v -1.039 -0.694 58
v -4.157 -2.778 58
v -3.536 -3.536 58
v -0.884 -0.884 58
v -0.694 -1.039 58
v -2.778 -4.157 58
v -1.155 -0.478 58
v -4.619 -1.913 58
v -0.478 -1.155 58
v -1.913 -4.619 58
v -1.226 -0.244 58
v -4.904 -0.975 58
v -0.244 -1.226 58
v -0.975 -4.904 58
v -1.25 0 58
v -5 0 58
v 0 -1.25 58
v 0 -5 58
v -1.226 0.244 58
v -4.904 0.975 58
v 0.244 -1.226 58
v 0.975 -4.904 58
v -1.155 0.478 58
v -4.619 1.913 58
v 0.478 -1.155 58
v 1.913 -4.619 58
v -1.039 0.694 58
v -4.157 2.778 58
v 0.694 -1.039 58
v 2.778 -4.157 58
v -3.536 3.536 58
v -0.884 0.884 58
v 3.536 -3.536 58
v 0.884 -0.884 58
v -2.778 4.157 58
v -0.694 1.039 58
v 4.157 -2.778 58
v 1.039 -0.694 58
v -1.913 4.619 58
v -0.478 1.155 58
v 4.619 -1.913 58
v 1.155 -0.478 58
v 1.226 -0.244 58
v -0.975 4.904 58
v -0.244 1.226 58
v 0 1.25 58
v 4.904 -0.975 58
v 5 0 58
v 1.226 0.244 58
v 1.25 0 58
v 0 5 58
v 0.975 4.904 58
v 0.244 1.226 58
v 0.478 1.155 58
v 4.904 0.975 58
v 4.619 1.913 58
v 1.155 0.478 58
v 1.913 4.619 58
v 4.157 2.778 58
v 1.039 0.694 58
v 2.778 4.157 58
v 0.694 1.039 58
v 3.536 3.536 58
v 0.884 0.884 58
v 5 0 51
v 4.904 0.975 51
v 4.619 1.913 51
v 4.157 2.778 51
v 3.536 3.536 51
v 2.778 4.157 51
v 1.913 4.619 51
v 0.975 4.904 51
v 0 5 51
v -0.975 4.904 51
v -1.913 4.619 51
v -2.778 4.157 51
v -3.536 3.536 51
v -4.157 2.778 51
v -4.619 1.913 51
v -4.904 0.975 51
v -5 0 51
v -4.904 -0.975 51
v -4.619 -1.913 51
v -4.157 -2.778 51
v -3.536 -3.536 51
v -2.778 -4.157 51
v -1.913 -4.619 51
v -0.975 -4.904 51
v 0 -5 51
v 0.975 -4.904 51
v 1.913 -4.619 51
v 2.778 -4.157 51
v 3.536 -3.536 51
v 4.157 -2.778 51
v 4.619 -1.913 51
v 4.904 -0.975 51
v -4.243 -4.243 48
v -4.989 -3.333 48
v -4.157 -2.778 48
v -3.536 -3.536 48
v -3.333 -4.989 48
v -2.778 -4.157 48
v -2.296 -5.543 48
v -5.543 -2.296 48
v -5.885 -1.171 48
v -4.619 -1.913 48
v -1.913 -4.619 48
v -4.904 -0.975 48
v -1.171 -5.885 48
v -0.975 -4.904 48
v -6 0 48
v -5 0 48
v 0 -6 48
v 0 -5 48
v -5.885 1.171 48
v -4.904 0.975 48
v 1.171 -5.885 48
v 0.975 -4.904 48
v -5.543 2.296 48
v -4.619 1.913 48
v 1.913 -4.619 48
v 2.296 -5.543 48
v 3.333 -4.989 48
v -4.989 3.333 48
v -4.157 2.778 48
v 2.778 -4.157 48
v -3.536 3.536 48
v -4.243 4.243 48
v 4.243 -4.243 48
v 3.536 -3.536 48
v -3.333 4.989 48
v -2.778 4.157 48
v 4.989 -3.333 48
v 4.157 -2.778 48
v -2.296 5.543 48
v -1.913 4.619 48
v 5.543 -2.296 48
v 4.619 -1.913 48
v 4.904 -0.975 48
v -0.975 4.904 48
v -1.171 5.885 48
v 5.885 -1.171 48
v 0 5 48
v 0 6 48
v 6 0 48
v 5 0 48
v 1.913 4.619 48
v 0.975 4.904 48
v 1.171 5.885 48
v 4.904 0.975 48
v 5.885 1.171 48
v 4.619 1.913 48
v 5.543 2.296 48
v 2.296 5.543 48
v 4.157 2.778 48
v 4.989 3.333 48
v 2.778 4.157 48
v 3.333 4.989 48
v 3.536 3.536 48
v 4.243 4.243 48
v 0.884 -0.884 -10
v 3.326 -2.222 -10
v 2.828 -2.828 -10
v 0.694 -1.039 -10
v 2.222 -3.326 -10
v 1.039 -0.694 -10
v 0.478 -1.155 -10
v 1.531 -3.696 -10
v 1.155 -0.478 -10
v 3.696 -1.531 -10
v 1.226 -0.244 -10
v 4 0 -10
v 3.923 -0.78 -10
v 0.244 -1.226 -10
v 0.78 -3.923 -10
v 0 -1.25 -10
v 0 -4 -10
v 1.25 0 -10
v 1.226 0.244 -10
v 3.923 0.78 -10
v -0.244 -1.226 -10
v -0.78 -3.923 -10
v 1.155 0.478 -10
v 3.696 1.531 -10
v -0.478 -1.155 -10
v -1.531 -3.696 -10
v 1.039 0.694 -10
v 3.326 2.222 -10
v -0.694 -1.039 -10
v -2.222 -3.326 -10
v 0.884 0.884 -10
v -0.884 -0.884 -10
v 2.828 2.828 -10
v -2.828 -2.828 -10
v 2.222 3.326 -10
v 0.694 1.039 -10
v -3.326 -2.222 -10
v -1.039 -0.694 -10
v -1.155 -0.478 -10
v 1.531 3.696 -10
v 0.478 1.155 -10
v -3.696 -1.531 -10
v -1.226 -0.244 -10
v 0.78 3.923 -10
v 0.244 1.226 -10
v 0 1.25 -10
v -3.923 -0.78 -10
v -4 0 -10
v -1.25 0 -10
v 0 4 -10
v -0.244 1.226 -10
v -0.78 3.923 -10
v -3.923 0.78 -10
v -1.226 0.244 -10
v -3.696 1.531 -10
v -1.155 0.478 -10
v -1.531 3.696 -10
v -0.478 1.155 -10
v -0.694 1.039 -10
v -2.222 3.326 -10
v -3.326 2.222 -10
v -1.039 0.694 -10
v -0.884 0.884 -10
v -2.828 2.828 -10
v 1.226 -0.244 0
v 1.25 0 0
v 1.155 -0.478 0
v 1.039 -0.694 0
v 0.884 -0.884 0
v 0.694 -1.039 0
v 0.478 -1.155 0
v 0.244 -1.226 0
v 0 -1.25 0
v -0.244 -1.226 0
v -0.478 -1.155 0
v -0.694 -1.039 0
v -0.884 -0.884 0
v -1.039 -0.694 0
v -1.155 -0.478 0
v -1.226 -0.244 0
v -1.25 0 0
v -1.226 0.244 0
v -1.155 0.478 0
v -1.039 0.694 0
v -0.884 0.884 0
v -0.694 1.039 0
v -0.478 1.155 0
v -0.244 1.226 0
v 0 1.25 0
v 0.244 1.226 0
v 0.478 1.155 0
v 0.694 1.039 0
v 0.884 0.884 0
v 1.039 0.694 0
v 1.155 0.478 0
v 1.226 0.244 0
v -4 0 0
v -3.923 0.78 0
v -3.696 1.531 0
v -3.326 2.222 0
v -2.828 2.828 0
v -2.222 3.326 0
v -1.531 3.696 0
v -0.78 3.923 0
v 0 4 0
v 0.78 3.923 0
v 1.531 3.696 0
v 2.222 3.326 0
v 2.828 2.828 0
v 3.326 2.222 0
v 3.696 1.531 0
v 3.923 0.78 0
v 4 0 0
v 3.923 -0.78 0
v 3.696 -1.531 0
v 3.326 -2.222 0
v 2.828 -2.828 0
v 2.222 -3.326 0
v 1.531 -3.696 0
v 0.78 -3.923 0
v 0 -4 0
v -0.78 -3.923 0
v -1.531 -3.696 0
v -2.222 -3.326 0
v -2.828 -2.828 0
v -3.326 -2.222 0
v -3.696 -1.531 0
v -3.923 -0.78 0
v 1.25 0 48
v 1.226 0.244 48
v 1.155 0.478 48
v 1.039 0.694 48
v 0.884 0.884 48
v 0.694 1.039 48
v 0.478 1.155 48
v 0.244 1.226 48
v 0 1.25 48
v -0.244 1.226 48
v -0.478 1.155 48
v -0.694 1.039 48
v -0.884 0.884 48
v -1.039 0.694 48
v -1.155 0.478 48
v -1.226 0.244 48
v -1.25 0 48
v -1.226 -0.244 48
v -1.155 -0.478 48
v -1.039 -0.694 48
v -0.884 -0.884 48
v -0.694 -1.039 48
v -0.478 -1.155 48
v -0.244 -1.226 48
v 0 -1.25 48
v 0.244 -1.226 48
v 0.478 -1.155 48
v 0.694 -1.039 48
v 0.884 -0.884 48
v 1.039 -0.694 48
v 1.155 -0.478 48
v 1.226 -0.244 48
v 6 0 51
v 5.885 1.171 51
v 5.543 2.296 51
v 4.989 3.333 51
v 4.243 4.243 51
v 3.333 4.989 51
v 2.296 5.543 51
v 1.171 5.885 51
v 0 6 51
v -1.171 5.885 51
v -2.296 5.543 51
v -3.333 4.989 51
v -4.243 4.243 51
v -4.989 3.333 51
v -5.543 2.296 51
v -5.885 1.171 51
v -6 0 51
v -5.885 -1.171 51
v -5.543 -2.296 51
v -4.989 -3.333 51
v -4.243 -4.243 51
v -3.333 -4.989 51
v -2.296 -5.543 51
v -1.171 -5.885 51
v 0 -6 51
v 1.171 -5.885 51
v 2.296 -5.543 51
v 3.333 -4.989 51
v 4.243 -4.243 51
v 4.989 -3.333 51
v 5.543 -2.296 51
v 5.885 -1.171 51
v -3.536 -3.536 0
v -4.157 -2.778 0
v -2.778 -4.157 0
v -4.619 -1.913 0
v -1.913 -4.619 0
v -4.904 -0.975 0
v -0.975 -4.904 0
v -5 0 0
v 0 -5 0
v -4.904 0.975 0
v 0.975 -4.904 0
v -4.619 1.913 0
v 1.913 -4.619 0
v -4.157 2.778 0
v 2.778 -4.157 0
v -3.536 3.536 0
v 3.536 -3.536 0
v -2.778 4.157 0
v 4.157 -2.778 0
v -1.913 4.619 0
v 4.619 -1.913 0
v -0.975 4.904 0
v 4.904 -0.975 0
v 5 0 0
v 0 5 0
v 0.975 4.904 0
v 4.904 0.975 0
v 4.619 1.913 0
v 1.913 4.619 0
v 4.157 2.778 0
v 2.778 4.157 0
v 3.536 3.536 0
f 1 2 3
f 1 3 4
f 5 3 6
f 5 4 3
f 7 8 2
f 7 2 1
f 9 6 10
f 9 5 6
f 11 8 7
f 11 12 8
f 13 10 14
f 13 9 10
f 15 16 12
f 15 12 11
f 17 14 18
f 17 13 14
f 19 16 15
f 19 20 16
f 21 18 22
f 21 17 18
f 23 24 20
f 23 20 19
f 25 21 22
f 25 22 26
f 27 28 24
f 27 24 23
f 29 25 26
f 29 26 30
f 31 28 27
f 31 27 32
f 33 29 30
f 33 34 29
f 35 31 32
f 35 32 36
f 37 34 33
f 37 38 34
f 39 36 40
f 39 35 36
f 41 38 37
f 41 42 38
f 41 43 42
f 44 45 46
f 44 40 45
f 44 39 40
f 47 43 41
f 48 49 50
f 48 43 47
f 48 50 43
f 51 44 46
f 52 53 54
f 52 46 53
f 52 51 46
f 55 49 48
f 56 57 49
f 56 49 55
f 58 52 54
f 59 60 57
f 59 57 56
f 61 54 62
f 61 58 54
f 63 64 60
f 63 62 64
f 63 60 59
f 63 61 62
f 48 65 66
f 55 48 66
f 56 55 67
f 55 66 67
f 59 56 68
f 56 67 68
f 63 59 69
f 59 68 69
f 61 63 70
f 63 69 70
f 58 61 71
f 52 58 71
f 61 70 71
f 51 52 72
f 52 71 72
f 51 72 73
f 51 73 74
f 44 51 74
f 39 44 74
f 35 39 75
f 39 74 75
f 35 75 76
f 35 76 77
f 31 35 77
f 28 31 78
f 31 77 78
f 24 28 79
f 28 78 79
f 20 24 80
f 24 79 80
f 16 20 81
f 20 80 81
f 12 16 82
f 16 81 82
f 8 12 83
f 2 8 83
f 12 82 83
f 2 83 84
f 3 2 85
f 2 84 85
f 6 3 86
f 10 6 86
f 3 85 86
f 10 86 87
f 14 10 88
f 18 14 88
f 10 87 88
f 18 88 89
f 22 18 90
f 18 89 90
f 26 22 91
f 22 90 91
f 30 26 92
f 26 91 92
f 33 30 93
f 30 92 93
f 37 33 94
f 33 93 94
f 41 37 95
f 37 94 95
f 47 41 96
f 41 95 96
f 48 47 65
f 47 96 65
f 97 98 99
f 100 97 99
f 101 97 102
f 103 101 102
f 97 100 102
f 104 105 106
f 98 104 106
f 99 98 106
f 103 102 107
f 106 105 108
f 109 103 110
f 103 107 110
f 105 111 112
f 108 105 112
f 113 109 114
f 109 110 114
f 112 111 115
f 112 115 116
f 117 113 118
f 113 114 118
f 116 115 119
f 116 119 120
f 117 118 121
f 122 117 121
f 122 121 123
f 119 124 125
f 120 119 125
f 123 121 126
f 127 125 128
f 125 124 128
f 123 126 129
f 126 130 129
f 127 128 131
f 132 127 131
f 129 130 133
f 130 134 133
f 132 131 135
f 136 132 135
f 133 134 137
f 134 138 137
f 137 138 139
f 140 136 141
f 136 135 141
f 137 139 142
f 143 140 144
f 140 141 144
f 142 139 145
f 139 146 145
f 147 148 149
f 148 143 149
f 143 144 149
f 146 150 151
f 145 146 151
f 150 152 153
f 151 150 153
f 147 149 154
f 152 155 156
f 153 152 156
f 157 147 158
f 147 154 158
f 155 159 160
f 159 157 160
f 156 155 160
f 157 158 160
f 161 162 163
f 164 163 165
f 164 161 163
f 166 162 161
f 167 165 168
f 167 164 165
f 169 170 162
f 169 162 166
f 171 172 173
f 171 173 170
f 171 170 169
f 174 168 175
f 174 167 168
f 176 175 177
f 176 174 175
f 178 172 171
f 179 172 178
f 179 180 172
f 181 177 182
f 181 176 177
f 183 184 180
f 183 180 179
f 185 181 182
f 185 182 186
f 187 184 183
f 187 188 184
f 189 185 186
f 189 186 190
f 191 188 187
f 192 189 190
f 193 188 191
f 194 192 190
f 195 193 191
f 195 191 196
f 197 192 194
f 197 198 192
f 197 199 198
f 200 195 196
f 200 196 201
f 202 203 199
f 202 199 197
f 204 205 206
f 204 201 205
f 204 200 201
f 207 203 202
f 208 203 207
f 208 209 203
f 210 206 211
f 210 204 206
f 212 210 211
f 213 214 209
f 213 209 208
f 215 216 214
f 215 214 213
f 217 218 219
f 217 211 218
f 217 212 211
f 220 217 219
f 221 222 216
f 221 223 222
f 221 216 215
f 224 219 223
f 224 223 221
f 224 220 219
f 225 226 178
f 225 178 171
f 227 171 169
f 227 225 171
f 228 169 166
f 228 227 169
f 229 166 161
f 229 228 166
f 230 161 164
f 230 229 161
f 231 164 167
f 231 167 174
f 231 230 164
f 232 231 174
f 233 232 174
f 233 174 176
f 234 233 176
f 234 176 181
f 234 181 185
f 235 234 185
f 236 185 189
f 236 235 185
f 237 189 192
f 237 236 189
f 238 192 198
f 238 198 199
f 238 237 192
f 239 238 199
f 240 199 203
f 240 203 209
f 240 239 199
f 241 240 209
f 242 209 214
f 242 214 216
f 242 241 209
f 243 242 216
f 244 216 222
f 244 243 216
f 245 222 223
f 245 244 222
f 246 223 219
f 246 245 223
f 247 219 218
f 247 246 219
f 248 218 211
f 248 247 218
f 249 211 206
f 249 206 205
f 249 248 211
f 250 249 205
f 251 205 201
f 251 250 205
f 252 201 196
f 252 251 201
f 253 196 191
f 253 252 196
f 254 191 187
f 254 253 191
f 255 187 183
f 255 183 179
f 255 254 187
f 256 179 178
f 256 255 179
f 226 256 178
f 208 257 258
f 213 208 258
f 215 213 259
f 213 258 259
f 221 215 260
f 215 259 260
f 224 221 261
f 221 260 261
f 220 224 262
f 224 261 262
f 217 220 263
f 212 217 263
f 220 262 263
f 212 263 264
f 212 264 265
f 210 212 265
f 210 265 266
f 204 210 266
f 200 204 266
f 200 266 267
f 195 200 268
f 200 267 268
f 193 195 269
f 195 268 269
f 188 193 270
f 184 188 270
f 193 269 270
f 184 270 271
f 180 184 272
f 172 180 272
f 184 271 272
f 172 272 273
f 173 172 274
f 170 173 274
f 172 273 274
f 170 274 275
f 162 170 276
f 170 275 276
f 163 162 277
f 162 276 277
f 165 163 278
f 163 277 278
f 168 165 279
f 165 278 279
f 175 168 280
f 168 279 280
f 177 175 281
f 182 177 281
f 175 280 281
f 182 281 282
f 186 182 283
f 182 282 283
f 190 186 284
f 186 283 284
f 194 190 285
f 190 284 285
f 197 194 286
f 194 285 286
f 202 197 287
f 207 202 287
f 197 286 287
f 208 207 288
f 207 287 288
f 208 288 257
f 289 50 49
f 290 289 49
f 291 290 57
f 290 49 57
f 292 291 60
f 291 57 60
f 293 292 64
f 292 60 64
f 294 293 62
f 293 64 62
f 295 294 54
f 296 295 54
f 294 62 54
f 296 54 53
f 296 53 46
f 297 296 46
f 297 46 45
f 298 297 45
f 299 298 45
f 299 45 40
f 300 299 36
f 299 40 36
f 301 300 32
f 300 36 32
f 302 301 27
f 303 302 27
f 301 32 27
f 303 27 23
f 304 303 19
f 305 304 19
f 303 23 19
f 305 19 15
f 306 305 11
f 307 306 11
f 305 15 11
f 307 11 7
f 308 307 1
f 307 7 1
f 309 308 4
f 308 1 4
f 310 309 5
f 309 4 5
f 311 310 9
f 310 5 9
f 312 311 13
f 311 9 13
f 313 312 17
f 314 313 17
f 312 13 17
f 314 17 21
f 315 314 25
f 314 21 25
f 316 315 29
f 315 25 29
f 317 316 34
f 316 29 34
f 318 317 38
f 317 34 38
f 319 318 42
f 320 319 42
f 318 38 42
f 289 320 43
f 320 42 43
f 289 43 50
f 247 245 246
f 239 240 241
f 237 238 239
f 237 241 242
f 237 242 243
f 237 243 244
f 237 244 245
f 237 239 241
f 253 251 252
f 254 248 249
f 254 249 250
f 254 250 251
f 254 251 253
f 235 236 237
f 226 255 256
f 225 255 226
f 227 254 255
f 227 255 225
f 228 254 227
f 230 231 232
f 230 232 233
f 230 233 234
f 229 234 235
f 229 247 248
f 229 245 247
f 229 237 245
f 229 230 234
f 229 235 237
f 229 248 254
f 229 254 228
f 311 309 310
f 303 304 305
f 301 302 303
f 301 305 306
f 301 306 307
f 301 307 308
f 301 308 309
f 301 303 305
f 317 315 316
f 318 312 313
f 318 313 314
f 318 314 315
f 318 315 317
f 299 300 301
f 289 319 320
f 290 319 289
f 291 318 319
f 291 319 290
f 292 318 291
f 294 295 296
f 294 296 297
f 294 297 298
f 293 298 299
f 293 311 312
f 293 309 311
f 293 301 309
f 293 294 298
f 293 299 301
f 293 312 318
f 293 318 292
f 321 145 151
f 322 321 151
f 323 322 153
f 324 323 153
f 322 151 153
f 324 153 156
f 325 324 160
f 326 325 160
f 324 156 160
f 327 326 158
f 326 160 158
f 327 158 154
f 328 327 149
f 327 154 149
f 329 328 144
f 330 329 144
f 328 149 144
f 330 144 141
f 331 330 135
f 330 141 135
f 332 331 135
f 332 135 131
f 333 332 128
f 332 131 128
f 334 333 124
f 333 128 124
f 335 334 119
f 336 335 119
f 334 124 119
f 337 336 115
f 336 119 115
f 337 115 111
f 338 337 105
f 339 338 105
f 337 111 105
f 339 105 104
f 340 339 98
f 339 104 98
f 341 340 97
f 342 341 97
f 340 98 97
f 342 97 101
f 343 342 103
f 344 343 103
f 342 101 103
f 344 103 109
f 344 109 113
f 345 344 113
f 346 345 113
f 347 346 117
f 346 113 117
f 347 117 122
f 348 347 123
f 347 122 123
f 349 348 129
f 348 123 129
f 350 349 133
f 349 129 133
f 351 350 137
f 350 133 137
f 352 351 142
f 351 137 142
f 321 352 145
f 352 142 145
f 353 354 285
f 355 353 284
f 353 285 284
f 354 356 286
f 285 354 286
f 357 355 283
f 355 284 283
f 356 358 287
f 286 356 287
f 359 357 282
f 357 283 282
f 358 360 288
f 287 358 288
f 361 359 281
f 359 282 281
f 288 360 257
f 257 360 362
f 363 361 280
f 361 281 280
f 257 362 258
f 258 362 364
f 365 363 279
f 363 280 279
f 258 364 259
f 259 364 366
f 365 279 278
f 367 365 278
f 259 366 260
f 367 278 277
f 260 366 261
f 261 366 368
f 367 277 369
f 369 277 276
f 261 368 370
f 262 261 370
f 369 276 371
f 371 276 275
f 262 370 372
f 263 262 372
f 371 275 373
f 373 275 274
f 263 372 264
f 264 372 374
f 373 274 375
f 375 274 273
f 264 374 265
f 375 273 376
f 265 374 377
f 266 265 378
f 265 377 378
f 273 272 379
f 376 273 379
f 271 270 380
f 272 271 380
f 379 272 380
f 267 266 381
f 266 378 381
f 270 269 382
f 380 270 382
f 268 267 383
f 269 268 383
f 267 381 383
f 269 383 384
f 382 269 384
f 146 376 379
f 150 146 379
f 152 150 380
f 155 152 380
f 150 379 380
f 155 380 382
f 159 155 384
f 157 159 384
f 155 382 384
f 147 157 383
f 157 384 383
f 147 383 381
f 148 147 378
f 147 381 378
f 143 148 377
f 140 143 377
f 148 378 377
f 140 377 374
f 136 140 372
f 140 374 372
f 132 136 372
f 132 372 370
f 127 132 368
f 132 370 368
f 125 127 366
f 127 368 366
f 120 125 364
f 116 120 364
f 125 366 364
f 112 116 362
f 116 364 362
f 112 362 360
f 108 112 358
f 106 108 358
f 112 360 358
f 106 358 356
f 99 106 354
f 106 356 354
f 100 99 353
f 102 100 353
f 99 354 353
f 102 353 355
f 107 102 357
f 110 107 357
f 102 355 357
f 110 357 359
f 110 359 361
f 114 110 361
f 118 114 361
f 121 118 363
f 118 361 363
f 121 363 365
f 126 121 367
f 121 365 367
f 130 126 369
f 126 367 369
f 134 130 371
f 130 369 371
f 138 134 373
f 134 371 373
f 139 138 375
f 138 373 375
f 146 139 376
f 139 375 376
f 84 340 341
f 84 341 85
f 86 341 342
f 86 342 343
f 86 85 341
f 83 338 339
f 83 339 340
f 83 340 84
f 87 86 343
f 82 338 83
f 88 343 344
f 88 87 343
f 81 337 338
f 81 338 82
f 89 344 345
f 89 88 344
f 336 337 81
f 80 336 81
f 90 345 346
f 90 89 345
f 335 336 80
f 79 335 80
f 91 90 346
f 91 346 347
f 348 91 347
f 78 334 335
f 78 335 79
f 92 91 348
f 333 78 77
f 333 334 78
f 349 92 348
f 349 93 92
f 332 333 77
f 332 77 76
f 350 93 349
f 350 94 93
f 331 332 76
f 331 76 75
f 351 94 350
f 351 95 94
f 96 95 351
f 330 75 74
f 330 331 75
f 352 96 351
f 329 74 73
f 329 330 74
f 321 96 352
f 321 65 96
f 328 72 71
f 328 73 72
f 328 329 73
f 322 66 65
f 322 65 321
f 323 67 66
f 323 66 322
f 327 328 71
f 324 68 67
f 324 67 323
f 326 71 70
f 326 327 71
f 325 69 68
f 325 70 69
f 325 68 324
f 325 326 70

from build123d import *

# Parameters (mm, degrees)
SKETCH_1_R          = 5
EXTRUDE_1_DEPTH     = 48
SKETCH_2_R          = 6
EXTRUDE_2_DEPTH     = 3
SKETCH_3_R          = 5
EXTRUDE_3_DEPTH     = 7
SKETCH_5_R          = 4
EXTRUDE_4_DEPTH     = 10
SKETCH_6_R          = 1.25
CUT_EXTRUDE_1_DEPTH = 10
CUT_EXTRUDE_START   = -10
SKETCH_7_R          = 1.25
CUT_EXTRUDE_2_DEPTH = 10


with BuildPart() as part:
    # 草图1 → 凸台-拉伸1 (new body)
    with BuildSketch(Plane.XY):
        Circle(SKETCH_1_R)
    extrude(amount=EXTRUDE_1_DEPTH)

    # 草图2 → 凸台-拉伸2 (add)
    with BuildSketch(Plane.XY.offset(48)):
        Circle(SKETCH_2_R)
    extrude(amount=EXTRUDE_2_DEPTH)

    # 草图3 → 凸台-拉伸3 (add)
    with BuildSketch(Plane.XY.offset(51)):
        Circle(SKETCH_3_R)
    extrude(amount=EXTRUDE_3_DEPTH)

    # 草图5 → 凸台-拉伸4 (add)
    with BuildSketch(Plane(origin=(0, 0, 0), x_dir=(-1, 0, 0), z_dir=(0, 0, -1))):
        Circle(SKETCH_5_R)
    extrude(amount=EXTRUDE_4_DEPTH)

    # 草图6 → 切除-拉伸1 (cut)
    with BuildSketch(Plane.XY.offset(58)):
        Circle(SKETCH_6_R)
    extrude(amount=-CUT_EXTRUDE_1_DEPTH, mode=Mode.SUBTRACT)

    # 草图7 → 切除-拉伸2 (cut)
    with BuildSketch(Plane(origin=(0, 0, -10), x_dir=(-1, 0, 0), z_dir=(0, 0, -1)).offset(CUT_EXTRUDE_START)):
        with Locations(Location((0, 0, 0), (0, 0, 180))):
            Circle(SKETCH_7_R)
    extrude(amount=CUT_EXTRUDE_2_DEPTH, mode=Mode.SUBTRACT)


solid = part.part
